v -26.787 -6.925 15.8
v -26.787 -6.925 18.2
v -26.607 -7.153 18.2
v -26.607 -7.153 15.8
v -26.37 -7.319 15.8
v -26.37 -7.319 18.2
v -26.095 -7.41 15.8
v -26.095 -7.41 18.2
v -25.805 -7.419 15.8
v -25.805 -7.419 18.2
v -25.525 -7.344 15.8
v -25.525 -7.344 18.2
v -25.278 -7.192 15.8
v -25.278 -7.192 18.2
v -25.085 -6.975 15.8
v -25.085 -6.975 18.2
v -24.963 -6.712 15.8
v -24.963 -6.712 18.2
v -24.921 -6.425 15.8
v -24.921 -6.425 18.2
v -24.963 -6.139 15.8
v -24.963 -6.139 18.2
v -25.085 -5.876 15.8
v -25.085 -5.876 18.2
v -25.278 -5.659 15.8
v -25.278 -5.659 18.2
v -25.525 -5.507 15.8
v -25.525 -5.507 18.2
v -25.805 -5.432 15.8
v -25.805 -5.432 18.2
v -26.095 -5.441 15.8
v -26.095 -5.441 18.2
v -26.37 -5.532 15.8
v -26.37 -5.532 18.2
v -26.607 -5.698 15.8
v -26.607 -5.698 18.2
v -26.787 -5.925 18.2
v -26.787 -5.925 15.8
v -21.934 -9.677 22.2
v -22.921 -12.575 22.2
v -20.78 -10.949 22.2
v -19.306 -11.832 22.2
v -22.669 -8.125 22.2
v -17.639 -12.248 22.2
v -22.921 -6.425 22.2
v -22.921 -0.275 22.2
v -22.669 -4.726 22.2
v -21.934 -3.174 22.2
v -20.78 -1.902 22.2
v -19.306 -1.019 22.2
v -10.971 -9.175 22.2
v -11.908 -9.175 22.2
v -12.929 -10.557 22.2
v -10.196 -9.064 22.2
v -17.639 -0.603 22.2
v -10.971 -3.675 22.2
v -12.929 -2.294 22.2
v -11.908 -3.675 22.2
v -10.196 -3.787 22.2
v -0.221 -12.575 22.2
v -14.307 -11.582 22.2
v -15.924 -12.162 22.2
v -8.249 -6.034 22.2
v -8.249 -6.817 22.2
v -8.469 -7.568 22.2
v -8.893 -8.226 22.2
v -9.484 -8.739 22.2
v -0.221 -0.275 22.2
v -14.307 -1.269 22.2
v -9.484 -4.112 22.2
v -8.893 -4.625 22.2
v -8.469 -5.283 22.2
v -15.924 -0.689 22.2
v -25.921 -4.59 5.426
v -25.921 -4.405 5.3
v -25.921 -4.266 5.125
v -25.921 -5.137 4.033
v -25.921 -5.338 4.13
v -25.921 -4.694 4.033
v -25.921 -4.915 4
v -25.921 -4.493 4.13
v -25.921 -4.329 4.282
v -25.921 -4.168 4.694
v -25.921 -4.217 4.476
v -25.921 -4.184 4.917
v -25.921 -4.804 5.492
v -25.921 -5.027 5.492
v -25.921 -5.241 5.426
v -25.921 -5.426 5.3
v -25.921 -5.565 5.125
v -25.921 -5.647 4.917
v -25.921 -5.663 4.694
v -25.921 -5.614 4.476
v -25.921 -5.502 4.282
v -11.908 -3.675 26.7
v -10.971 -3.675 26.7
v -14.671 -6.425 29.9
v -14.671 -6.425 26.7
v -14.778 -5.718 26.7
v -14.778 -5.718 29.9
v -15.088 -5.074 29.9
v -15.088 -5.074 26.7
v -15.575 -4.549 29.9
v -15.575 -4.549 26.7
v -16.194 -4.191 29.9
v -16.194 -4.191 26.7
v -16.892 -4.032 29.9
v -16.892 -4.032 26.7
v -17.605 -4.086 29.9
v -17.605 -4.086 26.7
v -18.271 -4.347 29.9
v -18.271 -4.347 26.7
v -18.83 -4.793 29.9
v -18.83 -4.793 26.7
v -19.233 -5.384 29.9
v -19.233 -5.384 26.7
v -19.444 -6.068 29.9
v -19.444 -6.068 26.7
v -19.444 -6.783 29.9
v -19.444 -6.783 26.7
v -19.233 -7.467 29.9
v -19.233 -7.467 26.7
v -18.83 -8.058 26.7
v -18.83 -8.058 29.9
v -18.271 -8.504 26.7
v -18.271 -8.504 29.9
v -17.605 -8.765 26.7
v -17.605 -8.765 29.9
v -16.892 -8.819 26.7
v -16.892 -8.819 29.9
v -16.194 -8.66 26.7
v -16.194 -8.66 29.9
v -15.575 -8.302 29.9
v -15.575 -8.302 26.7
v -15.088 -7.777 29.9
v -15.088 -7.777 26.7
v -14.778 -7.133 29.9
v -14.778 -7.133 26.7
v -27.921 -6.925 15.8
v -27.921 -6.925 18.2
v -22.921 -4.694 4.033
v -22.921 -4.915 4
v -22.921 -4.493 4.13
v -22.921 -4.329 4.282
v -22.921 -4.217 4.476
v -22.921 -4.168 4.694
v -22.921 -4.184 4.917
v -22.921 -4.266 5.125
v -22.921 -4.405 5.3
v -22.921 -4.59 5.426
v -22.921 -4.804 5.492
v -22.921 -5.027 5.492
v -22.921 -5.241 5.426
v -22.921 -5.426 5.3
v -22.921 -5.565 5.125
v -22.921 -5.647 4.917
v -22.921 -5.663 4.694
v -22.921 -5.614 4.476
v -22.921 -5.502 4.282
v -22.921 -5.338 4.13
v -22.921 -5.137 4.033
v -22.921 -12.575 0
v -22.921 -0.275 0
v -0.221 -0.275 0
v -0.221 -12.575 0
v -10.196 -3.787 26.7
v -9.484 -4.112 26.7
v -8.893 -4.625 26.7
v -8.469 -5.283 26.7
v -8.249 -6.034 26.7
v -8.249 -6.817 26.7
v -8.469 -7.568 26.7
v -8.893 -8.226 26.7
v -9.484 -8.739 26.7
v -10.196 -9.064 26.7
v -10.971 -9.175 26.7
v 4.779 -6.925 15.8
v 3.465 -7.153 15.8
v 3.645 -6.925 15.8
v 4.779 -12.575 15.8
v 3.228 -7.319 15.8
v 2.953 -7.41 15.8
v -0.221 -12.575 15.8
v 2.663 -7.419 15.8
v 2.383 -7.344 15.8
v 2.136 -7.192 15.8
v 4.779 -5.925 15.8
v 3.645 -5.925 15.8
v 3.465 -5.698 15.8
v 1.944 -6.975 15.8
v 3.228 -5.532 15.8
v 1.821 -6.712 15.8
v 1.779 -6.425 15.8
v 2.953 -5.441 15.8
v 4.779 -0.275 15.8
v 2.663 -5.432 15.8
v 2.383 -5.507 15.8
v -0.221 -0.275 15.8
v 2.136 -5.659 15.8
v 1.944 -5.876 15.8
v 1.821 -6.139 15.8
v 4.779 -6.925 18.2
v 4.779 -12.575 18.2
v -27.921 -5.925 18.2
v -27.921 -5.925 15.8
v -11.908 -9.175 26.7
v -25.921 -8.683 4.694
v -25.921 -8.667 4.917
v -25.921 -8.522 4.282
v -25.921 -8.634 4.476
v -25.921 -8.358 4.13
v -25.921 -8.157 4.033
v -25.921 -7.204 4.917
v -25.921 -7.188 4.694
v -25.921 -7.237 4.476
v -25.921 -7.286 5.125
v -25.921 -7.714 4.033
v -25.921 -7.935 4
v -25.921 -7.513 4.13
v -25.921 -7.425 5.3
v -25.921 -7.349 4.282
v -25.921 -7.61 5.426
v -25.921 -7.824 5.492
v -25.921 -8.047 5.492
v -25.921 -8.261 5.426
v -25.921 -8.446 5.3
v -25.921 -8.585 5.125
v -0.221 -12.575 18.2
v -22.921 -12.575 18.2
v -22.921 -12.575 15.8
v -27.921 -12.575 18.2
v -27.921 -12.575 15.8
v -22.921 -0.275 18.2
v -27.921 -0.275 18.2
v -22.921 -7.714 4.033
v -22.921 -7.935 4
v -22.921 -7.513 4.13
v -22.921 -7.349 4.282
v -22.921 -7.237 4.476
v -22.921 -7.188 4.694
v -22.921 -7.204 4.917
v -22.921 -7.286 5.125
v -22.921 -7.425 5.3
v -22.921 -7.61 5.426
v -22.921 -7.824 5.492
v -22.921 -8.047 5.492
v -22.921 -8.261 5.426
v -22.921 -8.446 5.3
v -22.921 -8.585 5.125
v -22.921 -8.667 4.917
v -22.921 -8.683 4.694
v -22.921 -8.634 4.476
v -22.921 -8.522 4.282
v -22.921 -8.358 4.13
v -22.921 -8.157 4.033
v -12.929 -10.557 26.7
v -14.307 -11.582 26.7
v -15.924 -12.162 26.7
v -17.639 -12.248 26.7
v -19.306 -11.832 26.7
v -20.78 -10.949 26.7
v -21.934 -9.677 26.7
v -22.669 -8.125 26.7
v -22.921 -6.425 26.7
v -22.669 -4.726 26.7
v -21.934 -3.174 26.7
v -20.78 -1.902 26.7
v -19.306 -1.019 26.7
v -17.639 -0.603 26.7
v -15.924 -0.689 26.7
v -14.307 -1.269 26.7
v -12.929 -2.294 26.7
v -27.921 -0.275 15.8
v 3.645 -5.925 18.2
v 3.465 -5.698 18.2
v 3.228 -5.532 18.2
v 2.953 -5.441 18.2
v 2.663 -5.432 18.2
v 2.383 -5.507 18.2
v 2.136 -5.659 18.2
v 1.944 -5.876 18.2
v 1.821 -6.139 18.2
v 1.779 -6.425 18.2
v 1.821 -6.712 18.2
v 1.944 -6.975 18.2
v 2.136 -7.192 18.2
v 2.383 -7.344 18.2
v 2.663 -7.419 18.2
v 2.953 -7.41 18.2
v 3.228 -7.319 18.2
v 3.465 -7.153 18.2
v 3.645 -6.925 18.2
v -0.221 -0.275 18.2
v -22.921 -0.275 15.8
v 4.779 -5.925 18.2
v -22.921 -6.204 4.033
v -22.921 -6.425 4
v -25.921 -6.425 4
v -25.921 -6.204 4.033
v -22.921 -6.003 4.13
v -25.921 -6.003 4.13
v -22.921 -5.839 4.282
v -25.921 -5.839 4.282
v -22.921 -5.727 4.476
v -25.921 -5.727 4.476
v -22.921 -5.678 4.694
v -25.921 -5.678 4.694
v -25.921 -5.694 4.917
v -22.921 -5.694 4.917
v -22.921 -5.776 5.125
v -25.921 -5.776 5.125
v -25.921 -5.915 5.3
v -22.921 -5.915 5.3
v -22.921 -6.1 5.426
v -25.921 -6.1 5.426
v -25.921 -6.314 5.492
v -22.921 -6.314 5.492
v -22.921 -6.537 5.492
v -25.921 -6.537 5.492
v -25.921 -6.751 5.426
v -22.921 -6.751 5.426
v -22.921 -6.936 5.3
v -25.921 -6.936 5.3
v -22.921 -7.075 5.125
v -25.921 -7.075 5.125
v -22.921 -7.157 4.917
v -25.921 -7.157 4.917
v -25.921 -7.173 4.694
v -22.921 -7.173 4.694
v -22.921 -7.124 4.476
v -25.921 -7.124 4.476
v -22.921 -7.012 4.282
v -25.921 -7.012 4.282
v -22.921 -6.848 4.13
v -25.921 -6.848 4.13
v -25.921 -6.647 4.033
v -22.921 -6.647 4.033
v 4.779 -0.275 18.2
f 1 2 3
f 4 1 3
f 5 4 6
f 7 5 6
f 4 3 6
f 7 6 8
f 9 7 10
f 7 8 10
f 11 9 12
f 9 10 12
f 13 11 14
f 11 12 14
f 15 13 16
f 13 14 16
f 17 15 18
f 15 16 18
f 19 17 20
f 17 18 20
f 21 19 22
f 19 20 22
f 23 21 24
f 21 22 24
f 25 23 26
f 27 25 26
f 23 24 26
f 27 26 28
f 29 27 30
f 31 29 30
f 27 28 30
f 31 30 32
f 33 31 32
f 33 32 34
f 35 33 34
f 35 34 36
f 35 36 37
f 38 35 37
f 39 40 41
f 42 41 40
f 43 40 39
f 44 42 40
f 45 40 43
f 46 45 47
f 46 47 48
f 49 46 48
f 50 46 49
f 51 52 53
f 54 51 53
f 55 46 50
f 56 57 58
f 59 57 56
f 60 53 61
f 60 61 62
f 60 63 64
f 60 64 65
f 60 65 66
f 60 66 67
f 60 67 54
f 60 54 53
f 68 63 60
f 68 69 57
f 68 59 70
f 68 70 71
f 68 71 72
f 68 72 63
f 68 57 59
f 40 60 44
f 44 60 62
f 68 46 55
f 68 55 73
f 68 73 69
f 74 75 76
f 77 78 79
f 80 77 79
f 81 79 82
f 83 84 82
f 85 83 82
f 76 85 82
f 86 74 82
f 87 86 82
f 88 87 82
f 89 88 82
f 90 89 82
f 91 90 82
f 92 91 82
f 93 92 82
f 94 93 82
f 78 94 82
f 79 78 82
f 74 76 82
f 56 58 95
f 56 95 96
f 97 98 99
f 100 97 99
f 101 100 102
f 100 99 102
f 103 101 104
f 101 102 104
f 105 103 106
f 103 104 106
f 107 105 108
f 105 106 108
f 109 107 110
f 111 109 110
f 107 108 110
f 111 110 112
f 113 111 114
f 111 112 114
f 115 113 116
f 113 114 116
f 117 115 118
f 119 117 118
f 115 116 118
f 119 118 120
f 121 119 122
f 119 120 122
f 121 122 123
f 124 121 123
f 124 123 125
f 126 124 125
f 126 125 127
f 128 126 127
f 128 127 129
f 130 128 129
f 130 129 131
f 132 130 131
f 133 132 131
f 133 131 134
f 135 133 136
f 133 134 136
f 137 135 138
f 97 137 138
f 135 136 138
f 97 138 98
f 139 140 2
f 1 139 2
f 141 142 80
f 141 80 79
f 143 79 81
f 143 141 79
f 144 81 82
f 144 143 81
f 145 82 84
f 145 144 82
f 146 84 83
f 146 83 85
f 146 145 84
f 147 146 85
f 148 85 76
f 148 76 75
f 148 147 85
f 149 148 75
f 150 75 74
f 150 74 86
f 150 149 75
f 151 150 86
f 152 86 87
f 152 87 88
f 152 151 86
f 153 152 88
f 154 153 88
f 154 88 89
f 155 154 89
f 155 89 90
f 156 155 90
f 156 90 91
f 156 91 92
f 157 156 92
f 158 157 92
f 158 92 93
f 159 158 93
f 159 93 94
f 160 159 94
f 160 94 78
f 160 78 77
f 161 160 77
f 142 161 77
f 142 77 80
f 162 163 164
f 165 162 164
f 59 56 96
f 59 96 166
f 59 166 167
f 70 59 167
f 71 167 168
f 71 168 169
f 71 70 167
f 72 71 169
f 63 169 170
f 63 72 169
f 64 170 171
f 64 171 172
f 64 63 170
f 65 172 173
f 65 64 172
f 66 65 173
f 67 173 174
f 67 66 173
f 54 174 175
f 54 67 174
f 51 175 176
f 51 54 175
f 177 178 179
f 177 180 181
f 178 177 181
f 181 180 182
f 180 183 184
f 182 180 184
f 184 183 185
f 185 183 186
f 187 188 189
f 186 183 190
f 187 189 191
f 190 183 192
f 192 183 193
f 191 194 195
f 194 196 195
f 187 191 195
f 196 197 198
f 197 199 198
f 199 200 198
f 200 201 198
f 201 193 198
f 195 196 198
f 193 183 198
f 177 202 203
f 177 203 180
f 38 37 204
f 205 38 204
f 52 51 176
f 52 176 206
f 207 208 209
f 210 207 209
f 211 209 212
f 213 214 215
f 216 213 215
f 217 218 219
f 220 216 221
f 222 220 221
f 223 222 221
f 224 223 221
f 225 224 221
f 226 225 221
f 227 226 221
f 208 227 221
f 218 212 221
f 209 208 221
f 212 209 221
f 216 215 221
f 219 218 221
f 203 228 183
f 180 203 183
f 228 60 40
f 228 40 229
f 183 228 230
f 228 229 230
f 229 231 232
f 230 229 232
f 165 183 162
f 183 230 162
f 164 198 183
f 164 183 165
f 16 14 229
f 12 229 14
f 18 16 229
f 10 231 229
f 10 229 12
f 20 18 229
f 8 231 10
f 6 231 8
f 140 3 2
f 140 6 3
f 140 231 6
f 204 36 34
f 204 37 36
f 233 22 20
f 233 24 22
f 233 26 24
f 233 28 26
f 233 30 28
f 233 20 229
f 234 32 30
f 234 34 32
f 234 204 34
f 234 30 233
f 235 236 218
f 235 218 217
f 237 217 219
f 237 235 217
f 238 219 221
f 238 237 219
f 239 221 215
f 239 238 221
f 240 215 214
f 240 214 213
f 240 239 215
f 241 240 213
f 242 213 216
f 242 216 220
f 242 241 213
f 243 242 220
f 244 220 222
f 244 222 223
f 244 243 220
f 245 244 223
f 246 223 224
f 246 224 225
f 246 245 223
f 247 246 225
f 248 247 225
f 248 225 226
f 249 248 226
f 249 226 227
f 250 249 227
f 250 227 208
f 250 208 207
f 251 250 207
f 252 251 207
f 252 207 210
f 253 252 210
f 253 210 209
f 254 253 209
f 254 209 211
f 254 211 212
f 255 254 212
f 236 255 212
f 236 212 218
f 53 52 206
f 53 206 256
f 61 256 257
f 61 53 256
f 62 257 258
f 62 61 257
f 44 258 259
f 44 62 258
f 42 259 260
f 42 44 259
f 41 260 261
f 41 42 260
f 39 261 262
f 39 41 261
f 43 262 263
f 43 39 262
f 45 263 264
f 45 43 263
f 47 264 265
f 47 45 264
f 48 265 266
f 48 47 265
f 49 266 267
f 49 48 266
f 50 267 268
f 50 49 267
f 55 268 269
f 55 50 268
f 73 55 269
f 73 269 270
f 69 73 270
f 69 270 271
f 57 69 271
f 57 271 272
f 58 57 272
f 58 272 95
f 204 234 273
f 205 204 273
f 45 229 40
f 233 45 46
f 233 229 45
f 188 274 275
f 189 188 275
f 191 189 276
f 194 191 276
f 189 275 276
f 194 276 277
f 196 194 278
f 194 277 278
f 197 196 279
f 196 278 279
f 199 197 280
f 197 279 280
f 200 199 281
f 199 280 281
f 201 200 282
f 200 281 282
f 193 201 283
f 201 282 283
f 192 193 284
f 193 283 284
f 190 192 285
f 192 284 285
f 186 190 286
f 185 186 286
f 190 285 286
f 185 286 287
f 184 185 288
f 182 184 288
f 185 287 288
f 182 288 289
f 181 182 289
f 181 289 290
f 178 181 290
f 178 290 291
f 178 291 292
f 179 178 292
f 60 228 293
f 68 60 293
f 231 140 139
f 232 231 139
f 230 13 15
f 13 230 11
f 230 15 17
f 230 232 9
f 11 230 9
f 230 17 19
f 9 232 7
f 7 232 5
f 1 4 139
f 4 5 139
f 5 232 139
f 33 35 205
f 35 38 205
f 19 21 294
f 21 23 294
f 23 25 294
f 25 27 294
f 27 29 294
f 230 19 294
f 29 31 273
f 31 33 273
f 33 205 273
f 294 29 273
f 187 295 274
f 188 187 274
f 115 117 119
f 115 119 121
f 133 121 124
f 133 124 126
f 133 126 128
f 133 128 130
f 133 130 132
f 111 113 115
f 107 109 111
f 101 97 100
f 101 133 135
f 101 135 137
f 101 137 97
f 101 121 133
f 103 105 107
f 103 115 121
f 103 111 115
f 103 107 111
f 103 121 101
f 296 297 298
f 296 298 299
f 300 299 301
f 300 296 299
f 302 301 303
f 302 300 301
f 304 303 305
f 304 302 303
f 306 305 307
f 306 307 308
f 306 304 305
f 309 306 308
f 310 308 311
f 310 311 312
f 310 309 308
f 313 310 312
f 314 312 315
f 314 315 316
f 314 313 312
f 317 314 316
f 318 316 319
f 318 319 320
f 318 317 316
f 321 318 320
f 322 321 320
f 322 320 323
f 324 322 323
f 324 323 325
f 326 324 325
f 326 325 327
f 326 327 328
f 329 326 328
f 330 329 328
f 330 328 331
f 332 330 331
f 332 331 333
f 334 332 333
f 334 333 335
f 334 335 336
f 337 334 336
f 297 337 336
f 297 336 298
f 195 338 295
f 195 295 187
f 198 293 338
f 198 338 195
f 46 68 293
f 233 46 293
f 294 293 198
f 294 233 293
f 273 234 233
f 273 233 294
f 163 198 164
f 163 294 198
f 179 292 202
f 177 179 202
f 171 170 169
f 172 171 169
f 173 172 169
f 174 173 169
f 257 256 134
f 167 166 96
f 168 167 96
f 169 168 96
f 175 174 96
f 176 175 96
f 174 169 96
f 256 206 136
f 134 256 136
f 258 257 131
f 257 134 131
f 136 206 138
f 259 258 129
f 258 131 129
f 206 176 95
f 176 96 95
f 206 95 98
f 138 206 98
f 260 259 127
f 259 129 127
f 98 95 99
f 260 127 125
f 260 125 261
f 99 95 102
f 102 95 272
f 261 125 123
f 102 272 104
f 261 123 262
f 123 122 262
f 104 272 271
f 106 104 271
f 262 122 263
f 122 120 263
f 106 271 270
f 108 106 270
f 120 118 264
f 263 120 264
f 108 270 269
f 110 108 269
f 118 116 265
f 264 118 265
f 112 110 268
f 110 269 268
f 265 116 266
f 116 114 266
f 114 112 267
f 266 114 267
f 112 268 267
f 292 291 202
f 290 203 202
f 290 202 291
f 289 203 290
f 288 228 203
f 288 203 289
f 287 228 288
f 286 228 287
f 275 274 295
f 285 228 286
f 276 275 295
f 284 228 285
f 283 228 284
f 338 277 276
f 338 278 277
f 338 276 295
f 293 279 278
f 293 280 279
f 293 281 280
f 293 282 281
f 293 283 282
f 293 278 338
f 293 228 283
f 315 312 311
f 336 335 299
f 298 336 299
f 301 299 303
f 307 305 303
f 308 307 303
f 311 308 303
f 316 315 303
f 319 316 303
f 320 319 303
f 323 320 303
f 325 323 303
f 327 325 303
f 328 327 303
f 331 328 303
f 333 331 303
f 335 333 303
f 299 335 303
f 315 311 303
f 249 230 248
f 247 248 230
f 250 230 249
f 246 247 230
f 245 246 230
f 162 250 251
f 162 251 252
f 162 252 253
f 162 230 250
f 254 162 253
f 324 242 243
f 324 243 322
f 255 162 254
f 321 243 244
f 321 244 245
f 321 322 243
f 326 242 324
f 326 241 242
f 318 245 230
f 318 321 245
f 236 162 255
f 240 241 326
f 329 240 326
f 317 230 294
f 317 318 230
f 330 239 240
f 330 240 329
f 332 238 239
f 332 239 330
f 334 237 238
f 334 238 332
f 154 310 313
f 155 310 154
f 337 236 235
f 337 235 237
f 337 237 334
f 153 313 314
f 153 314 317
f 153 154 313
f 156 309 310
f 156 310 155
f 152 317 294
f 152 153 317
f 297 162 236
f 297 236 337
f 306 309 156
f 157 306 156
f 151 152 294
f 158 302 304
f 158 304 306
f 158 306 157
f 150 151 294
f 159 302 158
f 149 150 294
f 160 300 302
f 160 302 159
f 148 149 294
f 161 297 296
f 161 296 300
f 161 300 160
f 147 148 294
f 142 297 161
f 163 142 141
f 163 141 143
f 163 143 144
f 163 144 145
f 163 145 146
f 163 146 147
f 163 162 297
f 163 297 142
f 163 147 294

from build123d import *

# Parameters (mm, degrees)
SZKIC1_W                         = 22.7
SZKIC1_H                         = 12.3
DODANIE_WYCI_GNI_CIE1_DEPTH      = 22.2
DODANIE_WYCI_GNI_CIE2_DEPTH      = 5
DODANIE_WYCI_GNI_CIE2_DEPTH_BACK = 27.7
SZKIC2_W                         = 2.4
SZKIC2_H                         = 12.3
DODANIE_WYCI_GNI_CIE3_DEPTH      = 4.5
SZKIC8_R                         = 2.4
DODANIE_WYCI_GNI_CIE4_DEPTH      = 3.2
WYTNIJ_WYCI_GNI_CIE1_DEPTH       = 2.4
WYTNIJ_WYCI_GNI_CIE2_DEPTH       = 2.4
SZKIC11_R                        = 0.75
DODANIE_WYCI_GNI_CIE8_DEPTH      = 25.7


with BuildPart() as part:
    # Szkic1 → Dodanie-wyciągnięcie1 (new body)
    with BuildSketch(Plane.XY):
        with Locations((-11.570890411, -6.425490196)):
            Rectangle(SZKIC1_W, SZKIC1_H)
    extrude(amount=DODANIE_WYCI_GNI_CIE1_DEPTH)

    # Szkic2 → Dodanie-wyciągnięcie2 (add, two sides: drawn at the far end of the back side and taken through both)
    with BuildSketch(Plane(origin=(-0.220890411, 0, 0), x_dir=(0, 0, -1), z_dir=(1, 0, 0)).offset(-DODANIE_WYCI_GNI_CIE2_DEPTH_BACK)):
        with Locations((-17, -6.425490196)):
            Rectangle(SZKIC2_W, SZKIC2_H)
    extrude(amount=DODANIE_WYCI_GNI_CIE2_DEPTH + DODANIE_WYCI_GNI_CIE2_DEPTH_BACK)

    # Szkic3 → Dodanie-wyciągnięcie3 (add)
    with BuildSketch(Plane.XY.offset(22.2)):
        with BuildLine():
            Line((-10.970890411, -9.175490196), (-11.907558154, -9.175490196))
            ThreePointArc((-11.907558154, -9.175490196), (-22.920890411, -6.425490196), (-11.907558154, -3.675490196))
            Line((-11.907558154, -3.675490196), (-10.970890411, -3.675490196))
            ThreePointArc((-10.970890411, -3.675490196), (-8.220890411, -6.425490196), (-10.970890411, -9.175490196))
        make_face()
    extrude(amount=DODANIE_WYCI_GNI_CIE3_DEPTH)

    # Szkic8 → Dodanie-wyciągnięcie4 (add)
    with BuildSketch(Plane.XY.offset(26.7)):
        with Locations((-17.070890411, -6.425490196)):
            Circle(SZKIC8_R)
    extrude(amount=DODANIE_WYCI_GNI_CIE4_DEPTH)

    # Szkic9 → Wytnij-wyciągnięcie1 (cut)
    with BuildSketch(Plane.XY.offset(18.2)):
        with BuildLine():
            Line((4.779109589, -6.425490196), (4.779109589, -5.925490196))
            Line((4.779109589, -5.925490196), (3.645134993, -5.925490196))
            ThreePointArc((3.645134993, -5.925490196), (1.779109589, -6.425490196), (3.645134993, -6.925490196))
            Line((3.645134993, -6.925490196), (4.779109589, -6.925490196))
            Line((4.779109589, -6.925490196), (4.779109589, -6.425490196))
        make_face()
    extrude(amount=-WYTNIJ_WYCI_GNI_CIE1_DEPTH, mode=Mode.SUBTRACT)

    # Szkic10 → Wytnij-wyciągnięcie2 (cut)
    with BuildSketch(Plane.XY.offset(18.2)):
        with BuildLine():
            Line((-27.920890411, -5.925490196), (-27.920890411, -6.925490196))
            Line((-27.920890411, -6.925490196), (-26.786915815, -6.925490196))
            ThreePointArc((-26.786915815, -6.925490196), (-24.920890411, -6.425490196), (-26.786915815, -5.925490196))
            Line((-26.786915815, -5.925490196), (-27.920890411, -5.925490196))
        make_face()
    extrude(amount=-WYTNIJ_WYCI_GNI_CIE2_DEPTH, mode=Mode.SUBTRACT)

    # Szkic11 → Dodanie-wyciągnięcie8 (add)
    with BuildSketch(Plane(origin=(-0.220890411, 0, 0), x_dir=(0, 0, -1), z_dir=(1, 0, 0))):
        with Locations((-4.75, -6.425490196)):
            Circle(SZKIC11_R)
        with Locations((-4.75, -4.915490196)):
            Circle(SZKIC11_R)
        with Locations((-4.75, -7.935490196)):
            Circle(SZKIC11_R)
    extrude(amount=-DODANIE_WYCI_GNI_CIE8_DEPTH)


solid = part.part
